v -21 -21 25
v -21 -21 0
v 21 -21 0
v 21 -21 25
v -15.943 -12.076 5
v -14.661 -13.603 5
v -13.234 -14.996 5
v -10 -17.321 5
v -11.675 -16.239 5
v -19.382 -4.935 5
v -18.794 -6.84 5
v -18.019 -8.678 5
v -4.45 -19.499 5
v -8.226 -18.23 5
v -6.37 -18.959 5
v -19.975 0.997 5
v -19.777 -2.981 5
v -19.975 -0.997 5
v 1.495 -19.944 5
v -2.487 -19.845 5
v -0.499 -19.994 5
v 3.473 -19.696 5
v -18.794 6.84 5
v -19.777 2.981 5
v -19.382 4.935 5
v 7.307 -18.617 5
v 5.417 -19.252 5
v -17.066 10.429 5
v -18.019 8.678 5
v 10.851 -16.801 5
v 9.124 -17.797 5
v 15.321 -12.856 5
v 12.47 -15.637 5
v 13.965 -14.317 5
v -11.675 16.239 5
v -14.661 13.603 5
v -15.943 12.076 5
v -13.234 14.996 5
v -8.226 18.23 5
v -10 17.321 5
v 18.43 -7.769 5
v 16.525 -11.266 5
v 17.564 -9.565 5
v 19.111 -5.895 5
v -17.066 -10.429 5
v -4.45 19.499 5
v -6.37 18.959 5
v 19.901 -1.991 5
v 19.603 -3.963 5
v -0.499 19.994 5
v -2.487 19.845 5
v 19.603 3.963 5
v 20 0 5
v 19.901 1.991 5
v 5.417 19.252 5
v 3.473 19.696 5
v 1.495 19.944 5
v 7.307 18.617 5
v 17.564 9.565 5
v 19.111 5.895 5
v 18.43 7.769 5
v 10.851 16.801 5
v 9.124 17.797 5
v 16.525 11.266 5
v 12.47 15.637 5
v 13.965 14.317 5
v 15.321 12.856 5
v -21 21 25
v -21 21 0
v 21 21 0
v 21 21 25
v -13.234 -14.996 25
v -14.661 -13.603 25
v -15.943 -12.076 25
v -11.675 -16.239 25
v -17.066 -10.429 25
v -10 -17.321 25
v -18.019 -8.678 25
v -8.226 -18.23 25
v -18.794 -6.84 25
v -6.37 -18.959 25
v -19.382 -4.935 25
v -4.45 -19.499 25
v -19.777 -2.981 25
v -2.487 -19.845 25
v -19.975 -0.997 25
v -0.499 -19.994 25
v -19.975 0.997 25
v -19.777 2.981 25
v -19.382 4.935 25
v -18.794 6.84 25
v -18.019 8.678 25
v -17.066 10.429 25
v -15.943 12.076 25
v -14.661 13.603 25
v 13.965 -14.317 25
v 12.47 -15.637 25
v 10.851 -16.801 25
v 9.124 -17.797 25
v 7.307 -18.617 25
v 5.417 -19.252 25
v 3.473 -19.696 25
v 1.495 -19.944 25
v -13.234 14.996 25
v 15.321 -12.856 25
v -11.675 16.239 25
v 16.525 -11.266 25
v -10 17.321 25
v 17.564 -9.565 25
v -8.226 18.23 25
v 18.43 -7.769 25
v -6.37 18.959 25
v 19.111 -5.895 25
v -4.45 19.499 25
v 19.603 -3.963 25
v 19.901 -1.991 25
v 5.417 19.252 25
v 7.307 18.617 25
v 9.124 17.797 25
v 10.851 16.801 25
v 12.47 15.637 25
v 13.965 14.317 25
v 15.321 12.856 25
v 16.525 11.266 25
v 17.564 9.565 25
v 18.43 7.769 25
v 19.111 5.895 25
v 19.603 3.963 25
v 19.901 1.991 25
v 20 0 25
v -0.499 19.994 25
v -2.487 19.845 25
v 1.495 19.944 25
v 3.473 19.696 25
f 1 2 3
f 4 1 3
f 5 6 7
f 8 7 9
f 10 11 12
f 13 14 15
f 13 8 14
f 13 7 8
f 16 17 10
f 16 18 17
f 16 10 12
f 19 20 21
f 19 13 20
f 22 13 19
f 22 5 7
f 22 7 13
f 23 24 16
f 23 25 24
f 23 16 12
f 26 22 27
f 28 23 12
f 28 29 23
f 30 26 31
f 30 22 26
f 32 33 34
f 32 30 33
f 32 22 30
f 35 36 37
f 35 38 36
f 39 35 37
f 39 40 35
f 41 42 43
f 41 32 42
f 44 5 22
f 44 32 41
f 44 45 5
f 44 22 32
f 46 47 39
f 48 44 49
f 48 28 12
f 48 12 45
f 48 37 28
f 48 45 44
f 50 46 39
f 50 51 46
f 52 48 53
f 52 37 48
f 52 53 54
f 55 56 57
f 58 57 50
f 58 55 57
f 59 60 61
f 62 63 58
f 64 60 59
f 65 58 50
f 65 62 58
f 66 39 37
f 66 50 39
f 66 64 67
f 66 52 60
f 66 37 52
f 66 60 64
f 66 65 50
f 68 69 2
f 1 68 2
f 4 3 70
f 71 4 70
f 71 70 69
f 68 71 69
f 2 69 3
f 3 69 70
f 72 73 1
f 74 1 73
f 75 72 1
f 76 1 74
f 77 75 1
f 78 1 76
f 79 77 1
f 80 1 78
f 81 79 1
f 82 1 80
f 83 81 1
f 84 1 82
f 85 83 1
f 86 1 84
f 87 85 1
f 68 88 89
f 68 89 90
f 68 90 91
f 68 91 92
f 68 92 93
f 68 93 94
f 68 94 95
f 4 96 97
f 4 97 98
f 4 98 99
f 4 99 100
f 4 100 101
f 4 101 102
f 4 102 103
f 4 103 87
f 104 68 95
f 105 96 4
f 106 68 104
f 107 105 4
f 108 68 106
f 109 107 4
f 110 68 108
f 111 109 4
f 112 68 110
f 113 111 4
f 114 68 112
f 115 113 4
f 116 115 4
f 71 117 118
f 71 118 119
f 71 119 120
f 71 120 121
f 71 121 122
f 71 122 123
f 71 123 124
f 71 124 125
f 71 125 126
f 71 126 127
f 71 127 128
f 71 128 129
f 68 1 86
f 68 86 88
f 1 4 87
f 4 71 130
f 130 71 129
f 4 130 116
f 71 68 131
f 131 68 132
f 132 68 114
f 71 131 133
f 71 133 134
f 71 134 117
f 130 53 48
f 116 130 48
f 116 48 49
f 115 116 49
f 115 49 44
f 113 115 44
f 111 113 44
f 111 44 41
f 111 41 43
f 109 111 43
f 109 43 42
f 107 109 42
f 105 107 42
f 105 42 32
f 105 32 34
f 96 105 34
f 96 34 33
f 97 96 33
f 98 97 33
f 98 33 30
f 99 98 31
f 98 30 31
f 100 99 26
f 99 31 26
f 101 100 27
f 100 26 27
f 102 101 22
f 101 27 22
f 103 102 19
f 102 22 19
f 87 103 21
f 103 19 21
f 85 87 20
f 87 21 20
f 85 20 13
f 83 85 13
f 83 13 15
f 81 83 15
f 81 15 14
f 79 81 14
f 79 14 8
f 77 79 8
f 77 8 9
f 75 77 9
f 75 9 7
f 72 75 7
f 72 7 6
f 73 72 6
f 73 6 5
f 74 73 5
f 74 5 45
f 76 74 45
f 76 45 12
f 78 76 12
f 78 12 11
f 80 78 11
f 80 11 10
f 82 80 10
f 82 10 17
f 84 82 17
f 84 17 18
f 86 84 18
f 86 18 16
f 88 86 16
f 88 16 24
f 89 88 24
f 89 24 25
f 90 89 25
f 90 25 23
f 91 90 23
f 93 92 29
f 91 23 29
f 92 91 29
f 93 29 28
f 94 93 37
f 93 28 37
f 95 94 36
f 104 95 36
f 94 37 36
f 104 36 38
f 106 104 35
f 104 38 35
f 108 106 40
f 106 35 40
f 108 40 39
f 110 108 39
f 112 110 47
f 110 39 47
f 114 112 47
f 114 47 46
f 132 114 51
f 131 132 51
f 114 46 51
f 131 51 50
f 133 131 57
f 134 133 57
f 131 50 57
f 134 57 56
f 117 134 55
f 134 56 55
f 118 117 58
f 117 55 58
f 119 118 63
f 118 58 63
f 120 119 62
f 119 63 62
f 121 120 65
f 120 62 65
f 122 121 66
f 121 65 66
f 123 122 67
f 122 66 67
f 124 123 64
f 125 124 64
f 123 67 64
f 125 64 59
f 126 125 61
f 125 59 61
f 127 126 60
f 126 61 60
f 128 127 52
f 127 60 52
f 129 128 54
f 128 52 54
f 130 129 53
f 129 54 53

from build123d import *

# Parameters (mm, degrees)
F1_DEPTH = 5
F2_DEPTH = 25


with BuildPart() as f1:
    # F0 (on Top) → F1 (new body)
    with BuildSketch(Plane.XY):
        Polygon((-21, 21), (-21, 0), (-21, -21), (21, -21), (21, 21), align=None)
        with BuildLine():
            ThreePointArc((-20, 0), (0, 20), (20, 0))
            ThreePointArc((20, 0), (0, -20), (-20, 0))
        make_face(mode=Mode.SUBTRACT)
        with BuildLine():
            ThreePointArc((-20, 0), (0, -20), (20, 0))
            ThreePointArc((20, 0), (0, 20), (-20, 0))
        make_face()
    extrude(amount=F1_DEPTH)

    # F0 (on Top) → F2 (join)
    with BuildSketch(Plane.XY):
        Polygon((-21, 21), (-21, 0), (-21, -21), (21, -21), (21, 21), align=None)
        with BuildLine():
            ThreePointArc((-20, 0), (0, 20), (20, 0))
            ThreePointArc((20, 0), (0, -20), (-20, 0))
        make_face(mode=Mode.SUBTRACT)
    extrude(amount=F2_DEPTH)


solid = f1.part
